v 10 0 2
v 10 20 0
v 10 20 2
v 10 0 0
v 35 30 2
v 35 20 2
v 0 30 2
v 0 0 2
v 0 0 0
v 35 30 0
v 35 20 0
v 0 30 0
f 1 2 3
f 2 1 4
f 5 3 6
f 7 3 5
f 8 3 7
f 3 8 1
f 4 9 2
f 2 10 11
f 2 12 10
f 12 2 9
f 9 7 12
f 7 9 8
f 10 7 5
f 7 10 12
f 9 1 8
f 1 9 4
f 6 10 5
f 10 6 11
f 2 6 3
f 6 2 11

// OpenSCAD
// SG90 gripper - v0
// Step 1: movable gripper jaw as a simple L shape.

$fn = 48;

// Set true before STL/G-code export so preview rotation is ignored.
EXPORT_FOR_PRINT = true;

// "movable", "fixed", or "both"
PART = "fixed";

// Change this for easier OpenSCAD viewing.
// Examples: [90, 0, 0], [0, 90, 0], [0, 0, 90]
view_rotation = [0, 0, 0];

// L jaw dimensions.
// X is thickness through the part.
// Y/Z form the L profile.
short_leg_len = 10; // mm, protruding hook length in Z
long_leg_len = 30;  // mm, long leg length in Y
jaw_x = 10;          // mm
jaw_z = 2;         // mm

// Gripping pad on the far end of the long leg.
grip_pad_x = 25; // mm
grip_pad_y = 10; // mm
grip_pad_z = 2;  // mm

module movable_l_jaw() {
    union() {
        // Long leg of the L, 30 mm in Y and 10 mm in Z.
        cube([jaw_x, long_leg_len, jaw_z], center = false);

        // Short leg of the L, protruding 10 mm in Z from one end.
        cube([jaw_x, jaw_z, jaw_z + short_leg_len], center = false);

        // Raised gripping pad at the end of the long leg.
        translate([
            jaw_x,
            long_leg_len - grip_pad_y,
            0
        ])
            cube([grip_pad_x, grip_pad_y, grip_pad_z], center = false);
    }
}

module fixed_l_jaw() {
    union() {
        // Same long leg as movable jaw.
        cube([jaw_x, long_leg_len, jaw_z], center = false);

        // Same gripping pad, but no 10 mm short/upright leg.
        translate([
            jaw_x,
            long_leg_len - grip_pad_y,
            0
        ])
            cube([grip_pad_x, grip_pad_y, grip_pad_z], center = false);
    }
}

module selected_part() {
    if (PART == "movable")
        movable_l_jaw();
    else if (PART == "fixed")
        fixed_l_jaw();
    else if (PART == "both") {
        movable_l_jaw();
        translate([22, 0, 0])
            fixed_l_jaw();
    }
}

if (EXPORT_FOR_PRINT)
    selected_part();
else
    rotate(view_rotation)
        selected_part();
